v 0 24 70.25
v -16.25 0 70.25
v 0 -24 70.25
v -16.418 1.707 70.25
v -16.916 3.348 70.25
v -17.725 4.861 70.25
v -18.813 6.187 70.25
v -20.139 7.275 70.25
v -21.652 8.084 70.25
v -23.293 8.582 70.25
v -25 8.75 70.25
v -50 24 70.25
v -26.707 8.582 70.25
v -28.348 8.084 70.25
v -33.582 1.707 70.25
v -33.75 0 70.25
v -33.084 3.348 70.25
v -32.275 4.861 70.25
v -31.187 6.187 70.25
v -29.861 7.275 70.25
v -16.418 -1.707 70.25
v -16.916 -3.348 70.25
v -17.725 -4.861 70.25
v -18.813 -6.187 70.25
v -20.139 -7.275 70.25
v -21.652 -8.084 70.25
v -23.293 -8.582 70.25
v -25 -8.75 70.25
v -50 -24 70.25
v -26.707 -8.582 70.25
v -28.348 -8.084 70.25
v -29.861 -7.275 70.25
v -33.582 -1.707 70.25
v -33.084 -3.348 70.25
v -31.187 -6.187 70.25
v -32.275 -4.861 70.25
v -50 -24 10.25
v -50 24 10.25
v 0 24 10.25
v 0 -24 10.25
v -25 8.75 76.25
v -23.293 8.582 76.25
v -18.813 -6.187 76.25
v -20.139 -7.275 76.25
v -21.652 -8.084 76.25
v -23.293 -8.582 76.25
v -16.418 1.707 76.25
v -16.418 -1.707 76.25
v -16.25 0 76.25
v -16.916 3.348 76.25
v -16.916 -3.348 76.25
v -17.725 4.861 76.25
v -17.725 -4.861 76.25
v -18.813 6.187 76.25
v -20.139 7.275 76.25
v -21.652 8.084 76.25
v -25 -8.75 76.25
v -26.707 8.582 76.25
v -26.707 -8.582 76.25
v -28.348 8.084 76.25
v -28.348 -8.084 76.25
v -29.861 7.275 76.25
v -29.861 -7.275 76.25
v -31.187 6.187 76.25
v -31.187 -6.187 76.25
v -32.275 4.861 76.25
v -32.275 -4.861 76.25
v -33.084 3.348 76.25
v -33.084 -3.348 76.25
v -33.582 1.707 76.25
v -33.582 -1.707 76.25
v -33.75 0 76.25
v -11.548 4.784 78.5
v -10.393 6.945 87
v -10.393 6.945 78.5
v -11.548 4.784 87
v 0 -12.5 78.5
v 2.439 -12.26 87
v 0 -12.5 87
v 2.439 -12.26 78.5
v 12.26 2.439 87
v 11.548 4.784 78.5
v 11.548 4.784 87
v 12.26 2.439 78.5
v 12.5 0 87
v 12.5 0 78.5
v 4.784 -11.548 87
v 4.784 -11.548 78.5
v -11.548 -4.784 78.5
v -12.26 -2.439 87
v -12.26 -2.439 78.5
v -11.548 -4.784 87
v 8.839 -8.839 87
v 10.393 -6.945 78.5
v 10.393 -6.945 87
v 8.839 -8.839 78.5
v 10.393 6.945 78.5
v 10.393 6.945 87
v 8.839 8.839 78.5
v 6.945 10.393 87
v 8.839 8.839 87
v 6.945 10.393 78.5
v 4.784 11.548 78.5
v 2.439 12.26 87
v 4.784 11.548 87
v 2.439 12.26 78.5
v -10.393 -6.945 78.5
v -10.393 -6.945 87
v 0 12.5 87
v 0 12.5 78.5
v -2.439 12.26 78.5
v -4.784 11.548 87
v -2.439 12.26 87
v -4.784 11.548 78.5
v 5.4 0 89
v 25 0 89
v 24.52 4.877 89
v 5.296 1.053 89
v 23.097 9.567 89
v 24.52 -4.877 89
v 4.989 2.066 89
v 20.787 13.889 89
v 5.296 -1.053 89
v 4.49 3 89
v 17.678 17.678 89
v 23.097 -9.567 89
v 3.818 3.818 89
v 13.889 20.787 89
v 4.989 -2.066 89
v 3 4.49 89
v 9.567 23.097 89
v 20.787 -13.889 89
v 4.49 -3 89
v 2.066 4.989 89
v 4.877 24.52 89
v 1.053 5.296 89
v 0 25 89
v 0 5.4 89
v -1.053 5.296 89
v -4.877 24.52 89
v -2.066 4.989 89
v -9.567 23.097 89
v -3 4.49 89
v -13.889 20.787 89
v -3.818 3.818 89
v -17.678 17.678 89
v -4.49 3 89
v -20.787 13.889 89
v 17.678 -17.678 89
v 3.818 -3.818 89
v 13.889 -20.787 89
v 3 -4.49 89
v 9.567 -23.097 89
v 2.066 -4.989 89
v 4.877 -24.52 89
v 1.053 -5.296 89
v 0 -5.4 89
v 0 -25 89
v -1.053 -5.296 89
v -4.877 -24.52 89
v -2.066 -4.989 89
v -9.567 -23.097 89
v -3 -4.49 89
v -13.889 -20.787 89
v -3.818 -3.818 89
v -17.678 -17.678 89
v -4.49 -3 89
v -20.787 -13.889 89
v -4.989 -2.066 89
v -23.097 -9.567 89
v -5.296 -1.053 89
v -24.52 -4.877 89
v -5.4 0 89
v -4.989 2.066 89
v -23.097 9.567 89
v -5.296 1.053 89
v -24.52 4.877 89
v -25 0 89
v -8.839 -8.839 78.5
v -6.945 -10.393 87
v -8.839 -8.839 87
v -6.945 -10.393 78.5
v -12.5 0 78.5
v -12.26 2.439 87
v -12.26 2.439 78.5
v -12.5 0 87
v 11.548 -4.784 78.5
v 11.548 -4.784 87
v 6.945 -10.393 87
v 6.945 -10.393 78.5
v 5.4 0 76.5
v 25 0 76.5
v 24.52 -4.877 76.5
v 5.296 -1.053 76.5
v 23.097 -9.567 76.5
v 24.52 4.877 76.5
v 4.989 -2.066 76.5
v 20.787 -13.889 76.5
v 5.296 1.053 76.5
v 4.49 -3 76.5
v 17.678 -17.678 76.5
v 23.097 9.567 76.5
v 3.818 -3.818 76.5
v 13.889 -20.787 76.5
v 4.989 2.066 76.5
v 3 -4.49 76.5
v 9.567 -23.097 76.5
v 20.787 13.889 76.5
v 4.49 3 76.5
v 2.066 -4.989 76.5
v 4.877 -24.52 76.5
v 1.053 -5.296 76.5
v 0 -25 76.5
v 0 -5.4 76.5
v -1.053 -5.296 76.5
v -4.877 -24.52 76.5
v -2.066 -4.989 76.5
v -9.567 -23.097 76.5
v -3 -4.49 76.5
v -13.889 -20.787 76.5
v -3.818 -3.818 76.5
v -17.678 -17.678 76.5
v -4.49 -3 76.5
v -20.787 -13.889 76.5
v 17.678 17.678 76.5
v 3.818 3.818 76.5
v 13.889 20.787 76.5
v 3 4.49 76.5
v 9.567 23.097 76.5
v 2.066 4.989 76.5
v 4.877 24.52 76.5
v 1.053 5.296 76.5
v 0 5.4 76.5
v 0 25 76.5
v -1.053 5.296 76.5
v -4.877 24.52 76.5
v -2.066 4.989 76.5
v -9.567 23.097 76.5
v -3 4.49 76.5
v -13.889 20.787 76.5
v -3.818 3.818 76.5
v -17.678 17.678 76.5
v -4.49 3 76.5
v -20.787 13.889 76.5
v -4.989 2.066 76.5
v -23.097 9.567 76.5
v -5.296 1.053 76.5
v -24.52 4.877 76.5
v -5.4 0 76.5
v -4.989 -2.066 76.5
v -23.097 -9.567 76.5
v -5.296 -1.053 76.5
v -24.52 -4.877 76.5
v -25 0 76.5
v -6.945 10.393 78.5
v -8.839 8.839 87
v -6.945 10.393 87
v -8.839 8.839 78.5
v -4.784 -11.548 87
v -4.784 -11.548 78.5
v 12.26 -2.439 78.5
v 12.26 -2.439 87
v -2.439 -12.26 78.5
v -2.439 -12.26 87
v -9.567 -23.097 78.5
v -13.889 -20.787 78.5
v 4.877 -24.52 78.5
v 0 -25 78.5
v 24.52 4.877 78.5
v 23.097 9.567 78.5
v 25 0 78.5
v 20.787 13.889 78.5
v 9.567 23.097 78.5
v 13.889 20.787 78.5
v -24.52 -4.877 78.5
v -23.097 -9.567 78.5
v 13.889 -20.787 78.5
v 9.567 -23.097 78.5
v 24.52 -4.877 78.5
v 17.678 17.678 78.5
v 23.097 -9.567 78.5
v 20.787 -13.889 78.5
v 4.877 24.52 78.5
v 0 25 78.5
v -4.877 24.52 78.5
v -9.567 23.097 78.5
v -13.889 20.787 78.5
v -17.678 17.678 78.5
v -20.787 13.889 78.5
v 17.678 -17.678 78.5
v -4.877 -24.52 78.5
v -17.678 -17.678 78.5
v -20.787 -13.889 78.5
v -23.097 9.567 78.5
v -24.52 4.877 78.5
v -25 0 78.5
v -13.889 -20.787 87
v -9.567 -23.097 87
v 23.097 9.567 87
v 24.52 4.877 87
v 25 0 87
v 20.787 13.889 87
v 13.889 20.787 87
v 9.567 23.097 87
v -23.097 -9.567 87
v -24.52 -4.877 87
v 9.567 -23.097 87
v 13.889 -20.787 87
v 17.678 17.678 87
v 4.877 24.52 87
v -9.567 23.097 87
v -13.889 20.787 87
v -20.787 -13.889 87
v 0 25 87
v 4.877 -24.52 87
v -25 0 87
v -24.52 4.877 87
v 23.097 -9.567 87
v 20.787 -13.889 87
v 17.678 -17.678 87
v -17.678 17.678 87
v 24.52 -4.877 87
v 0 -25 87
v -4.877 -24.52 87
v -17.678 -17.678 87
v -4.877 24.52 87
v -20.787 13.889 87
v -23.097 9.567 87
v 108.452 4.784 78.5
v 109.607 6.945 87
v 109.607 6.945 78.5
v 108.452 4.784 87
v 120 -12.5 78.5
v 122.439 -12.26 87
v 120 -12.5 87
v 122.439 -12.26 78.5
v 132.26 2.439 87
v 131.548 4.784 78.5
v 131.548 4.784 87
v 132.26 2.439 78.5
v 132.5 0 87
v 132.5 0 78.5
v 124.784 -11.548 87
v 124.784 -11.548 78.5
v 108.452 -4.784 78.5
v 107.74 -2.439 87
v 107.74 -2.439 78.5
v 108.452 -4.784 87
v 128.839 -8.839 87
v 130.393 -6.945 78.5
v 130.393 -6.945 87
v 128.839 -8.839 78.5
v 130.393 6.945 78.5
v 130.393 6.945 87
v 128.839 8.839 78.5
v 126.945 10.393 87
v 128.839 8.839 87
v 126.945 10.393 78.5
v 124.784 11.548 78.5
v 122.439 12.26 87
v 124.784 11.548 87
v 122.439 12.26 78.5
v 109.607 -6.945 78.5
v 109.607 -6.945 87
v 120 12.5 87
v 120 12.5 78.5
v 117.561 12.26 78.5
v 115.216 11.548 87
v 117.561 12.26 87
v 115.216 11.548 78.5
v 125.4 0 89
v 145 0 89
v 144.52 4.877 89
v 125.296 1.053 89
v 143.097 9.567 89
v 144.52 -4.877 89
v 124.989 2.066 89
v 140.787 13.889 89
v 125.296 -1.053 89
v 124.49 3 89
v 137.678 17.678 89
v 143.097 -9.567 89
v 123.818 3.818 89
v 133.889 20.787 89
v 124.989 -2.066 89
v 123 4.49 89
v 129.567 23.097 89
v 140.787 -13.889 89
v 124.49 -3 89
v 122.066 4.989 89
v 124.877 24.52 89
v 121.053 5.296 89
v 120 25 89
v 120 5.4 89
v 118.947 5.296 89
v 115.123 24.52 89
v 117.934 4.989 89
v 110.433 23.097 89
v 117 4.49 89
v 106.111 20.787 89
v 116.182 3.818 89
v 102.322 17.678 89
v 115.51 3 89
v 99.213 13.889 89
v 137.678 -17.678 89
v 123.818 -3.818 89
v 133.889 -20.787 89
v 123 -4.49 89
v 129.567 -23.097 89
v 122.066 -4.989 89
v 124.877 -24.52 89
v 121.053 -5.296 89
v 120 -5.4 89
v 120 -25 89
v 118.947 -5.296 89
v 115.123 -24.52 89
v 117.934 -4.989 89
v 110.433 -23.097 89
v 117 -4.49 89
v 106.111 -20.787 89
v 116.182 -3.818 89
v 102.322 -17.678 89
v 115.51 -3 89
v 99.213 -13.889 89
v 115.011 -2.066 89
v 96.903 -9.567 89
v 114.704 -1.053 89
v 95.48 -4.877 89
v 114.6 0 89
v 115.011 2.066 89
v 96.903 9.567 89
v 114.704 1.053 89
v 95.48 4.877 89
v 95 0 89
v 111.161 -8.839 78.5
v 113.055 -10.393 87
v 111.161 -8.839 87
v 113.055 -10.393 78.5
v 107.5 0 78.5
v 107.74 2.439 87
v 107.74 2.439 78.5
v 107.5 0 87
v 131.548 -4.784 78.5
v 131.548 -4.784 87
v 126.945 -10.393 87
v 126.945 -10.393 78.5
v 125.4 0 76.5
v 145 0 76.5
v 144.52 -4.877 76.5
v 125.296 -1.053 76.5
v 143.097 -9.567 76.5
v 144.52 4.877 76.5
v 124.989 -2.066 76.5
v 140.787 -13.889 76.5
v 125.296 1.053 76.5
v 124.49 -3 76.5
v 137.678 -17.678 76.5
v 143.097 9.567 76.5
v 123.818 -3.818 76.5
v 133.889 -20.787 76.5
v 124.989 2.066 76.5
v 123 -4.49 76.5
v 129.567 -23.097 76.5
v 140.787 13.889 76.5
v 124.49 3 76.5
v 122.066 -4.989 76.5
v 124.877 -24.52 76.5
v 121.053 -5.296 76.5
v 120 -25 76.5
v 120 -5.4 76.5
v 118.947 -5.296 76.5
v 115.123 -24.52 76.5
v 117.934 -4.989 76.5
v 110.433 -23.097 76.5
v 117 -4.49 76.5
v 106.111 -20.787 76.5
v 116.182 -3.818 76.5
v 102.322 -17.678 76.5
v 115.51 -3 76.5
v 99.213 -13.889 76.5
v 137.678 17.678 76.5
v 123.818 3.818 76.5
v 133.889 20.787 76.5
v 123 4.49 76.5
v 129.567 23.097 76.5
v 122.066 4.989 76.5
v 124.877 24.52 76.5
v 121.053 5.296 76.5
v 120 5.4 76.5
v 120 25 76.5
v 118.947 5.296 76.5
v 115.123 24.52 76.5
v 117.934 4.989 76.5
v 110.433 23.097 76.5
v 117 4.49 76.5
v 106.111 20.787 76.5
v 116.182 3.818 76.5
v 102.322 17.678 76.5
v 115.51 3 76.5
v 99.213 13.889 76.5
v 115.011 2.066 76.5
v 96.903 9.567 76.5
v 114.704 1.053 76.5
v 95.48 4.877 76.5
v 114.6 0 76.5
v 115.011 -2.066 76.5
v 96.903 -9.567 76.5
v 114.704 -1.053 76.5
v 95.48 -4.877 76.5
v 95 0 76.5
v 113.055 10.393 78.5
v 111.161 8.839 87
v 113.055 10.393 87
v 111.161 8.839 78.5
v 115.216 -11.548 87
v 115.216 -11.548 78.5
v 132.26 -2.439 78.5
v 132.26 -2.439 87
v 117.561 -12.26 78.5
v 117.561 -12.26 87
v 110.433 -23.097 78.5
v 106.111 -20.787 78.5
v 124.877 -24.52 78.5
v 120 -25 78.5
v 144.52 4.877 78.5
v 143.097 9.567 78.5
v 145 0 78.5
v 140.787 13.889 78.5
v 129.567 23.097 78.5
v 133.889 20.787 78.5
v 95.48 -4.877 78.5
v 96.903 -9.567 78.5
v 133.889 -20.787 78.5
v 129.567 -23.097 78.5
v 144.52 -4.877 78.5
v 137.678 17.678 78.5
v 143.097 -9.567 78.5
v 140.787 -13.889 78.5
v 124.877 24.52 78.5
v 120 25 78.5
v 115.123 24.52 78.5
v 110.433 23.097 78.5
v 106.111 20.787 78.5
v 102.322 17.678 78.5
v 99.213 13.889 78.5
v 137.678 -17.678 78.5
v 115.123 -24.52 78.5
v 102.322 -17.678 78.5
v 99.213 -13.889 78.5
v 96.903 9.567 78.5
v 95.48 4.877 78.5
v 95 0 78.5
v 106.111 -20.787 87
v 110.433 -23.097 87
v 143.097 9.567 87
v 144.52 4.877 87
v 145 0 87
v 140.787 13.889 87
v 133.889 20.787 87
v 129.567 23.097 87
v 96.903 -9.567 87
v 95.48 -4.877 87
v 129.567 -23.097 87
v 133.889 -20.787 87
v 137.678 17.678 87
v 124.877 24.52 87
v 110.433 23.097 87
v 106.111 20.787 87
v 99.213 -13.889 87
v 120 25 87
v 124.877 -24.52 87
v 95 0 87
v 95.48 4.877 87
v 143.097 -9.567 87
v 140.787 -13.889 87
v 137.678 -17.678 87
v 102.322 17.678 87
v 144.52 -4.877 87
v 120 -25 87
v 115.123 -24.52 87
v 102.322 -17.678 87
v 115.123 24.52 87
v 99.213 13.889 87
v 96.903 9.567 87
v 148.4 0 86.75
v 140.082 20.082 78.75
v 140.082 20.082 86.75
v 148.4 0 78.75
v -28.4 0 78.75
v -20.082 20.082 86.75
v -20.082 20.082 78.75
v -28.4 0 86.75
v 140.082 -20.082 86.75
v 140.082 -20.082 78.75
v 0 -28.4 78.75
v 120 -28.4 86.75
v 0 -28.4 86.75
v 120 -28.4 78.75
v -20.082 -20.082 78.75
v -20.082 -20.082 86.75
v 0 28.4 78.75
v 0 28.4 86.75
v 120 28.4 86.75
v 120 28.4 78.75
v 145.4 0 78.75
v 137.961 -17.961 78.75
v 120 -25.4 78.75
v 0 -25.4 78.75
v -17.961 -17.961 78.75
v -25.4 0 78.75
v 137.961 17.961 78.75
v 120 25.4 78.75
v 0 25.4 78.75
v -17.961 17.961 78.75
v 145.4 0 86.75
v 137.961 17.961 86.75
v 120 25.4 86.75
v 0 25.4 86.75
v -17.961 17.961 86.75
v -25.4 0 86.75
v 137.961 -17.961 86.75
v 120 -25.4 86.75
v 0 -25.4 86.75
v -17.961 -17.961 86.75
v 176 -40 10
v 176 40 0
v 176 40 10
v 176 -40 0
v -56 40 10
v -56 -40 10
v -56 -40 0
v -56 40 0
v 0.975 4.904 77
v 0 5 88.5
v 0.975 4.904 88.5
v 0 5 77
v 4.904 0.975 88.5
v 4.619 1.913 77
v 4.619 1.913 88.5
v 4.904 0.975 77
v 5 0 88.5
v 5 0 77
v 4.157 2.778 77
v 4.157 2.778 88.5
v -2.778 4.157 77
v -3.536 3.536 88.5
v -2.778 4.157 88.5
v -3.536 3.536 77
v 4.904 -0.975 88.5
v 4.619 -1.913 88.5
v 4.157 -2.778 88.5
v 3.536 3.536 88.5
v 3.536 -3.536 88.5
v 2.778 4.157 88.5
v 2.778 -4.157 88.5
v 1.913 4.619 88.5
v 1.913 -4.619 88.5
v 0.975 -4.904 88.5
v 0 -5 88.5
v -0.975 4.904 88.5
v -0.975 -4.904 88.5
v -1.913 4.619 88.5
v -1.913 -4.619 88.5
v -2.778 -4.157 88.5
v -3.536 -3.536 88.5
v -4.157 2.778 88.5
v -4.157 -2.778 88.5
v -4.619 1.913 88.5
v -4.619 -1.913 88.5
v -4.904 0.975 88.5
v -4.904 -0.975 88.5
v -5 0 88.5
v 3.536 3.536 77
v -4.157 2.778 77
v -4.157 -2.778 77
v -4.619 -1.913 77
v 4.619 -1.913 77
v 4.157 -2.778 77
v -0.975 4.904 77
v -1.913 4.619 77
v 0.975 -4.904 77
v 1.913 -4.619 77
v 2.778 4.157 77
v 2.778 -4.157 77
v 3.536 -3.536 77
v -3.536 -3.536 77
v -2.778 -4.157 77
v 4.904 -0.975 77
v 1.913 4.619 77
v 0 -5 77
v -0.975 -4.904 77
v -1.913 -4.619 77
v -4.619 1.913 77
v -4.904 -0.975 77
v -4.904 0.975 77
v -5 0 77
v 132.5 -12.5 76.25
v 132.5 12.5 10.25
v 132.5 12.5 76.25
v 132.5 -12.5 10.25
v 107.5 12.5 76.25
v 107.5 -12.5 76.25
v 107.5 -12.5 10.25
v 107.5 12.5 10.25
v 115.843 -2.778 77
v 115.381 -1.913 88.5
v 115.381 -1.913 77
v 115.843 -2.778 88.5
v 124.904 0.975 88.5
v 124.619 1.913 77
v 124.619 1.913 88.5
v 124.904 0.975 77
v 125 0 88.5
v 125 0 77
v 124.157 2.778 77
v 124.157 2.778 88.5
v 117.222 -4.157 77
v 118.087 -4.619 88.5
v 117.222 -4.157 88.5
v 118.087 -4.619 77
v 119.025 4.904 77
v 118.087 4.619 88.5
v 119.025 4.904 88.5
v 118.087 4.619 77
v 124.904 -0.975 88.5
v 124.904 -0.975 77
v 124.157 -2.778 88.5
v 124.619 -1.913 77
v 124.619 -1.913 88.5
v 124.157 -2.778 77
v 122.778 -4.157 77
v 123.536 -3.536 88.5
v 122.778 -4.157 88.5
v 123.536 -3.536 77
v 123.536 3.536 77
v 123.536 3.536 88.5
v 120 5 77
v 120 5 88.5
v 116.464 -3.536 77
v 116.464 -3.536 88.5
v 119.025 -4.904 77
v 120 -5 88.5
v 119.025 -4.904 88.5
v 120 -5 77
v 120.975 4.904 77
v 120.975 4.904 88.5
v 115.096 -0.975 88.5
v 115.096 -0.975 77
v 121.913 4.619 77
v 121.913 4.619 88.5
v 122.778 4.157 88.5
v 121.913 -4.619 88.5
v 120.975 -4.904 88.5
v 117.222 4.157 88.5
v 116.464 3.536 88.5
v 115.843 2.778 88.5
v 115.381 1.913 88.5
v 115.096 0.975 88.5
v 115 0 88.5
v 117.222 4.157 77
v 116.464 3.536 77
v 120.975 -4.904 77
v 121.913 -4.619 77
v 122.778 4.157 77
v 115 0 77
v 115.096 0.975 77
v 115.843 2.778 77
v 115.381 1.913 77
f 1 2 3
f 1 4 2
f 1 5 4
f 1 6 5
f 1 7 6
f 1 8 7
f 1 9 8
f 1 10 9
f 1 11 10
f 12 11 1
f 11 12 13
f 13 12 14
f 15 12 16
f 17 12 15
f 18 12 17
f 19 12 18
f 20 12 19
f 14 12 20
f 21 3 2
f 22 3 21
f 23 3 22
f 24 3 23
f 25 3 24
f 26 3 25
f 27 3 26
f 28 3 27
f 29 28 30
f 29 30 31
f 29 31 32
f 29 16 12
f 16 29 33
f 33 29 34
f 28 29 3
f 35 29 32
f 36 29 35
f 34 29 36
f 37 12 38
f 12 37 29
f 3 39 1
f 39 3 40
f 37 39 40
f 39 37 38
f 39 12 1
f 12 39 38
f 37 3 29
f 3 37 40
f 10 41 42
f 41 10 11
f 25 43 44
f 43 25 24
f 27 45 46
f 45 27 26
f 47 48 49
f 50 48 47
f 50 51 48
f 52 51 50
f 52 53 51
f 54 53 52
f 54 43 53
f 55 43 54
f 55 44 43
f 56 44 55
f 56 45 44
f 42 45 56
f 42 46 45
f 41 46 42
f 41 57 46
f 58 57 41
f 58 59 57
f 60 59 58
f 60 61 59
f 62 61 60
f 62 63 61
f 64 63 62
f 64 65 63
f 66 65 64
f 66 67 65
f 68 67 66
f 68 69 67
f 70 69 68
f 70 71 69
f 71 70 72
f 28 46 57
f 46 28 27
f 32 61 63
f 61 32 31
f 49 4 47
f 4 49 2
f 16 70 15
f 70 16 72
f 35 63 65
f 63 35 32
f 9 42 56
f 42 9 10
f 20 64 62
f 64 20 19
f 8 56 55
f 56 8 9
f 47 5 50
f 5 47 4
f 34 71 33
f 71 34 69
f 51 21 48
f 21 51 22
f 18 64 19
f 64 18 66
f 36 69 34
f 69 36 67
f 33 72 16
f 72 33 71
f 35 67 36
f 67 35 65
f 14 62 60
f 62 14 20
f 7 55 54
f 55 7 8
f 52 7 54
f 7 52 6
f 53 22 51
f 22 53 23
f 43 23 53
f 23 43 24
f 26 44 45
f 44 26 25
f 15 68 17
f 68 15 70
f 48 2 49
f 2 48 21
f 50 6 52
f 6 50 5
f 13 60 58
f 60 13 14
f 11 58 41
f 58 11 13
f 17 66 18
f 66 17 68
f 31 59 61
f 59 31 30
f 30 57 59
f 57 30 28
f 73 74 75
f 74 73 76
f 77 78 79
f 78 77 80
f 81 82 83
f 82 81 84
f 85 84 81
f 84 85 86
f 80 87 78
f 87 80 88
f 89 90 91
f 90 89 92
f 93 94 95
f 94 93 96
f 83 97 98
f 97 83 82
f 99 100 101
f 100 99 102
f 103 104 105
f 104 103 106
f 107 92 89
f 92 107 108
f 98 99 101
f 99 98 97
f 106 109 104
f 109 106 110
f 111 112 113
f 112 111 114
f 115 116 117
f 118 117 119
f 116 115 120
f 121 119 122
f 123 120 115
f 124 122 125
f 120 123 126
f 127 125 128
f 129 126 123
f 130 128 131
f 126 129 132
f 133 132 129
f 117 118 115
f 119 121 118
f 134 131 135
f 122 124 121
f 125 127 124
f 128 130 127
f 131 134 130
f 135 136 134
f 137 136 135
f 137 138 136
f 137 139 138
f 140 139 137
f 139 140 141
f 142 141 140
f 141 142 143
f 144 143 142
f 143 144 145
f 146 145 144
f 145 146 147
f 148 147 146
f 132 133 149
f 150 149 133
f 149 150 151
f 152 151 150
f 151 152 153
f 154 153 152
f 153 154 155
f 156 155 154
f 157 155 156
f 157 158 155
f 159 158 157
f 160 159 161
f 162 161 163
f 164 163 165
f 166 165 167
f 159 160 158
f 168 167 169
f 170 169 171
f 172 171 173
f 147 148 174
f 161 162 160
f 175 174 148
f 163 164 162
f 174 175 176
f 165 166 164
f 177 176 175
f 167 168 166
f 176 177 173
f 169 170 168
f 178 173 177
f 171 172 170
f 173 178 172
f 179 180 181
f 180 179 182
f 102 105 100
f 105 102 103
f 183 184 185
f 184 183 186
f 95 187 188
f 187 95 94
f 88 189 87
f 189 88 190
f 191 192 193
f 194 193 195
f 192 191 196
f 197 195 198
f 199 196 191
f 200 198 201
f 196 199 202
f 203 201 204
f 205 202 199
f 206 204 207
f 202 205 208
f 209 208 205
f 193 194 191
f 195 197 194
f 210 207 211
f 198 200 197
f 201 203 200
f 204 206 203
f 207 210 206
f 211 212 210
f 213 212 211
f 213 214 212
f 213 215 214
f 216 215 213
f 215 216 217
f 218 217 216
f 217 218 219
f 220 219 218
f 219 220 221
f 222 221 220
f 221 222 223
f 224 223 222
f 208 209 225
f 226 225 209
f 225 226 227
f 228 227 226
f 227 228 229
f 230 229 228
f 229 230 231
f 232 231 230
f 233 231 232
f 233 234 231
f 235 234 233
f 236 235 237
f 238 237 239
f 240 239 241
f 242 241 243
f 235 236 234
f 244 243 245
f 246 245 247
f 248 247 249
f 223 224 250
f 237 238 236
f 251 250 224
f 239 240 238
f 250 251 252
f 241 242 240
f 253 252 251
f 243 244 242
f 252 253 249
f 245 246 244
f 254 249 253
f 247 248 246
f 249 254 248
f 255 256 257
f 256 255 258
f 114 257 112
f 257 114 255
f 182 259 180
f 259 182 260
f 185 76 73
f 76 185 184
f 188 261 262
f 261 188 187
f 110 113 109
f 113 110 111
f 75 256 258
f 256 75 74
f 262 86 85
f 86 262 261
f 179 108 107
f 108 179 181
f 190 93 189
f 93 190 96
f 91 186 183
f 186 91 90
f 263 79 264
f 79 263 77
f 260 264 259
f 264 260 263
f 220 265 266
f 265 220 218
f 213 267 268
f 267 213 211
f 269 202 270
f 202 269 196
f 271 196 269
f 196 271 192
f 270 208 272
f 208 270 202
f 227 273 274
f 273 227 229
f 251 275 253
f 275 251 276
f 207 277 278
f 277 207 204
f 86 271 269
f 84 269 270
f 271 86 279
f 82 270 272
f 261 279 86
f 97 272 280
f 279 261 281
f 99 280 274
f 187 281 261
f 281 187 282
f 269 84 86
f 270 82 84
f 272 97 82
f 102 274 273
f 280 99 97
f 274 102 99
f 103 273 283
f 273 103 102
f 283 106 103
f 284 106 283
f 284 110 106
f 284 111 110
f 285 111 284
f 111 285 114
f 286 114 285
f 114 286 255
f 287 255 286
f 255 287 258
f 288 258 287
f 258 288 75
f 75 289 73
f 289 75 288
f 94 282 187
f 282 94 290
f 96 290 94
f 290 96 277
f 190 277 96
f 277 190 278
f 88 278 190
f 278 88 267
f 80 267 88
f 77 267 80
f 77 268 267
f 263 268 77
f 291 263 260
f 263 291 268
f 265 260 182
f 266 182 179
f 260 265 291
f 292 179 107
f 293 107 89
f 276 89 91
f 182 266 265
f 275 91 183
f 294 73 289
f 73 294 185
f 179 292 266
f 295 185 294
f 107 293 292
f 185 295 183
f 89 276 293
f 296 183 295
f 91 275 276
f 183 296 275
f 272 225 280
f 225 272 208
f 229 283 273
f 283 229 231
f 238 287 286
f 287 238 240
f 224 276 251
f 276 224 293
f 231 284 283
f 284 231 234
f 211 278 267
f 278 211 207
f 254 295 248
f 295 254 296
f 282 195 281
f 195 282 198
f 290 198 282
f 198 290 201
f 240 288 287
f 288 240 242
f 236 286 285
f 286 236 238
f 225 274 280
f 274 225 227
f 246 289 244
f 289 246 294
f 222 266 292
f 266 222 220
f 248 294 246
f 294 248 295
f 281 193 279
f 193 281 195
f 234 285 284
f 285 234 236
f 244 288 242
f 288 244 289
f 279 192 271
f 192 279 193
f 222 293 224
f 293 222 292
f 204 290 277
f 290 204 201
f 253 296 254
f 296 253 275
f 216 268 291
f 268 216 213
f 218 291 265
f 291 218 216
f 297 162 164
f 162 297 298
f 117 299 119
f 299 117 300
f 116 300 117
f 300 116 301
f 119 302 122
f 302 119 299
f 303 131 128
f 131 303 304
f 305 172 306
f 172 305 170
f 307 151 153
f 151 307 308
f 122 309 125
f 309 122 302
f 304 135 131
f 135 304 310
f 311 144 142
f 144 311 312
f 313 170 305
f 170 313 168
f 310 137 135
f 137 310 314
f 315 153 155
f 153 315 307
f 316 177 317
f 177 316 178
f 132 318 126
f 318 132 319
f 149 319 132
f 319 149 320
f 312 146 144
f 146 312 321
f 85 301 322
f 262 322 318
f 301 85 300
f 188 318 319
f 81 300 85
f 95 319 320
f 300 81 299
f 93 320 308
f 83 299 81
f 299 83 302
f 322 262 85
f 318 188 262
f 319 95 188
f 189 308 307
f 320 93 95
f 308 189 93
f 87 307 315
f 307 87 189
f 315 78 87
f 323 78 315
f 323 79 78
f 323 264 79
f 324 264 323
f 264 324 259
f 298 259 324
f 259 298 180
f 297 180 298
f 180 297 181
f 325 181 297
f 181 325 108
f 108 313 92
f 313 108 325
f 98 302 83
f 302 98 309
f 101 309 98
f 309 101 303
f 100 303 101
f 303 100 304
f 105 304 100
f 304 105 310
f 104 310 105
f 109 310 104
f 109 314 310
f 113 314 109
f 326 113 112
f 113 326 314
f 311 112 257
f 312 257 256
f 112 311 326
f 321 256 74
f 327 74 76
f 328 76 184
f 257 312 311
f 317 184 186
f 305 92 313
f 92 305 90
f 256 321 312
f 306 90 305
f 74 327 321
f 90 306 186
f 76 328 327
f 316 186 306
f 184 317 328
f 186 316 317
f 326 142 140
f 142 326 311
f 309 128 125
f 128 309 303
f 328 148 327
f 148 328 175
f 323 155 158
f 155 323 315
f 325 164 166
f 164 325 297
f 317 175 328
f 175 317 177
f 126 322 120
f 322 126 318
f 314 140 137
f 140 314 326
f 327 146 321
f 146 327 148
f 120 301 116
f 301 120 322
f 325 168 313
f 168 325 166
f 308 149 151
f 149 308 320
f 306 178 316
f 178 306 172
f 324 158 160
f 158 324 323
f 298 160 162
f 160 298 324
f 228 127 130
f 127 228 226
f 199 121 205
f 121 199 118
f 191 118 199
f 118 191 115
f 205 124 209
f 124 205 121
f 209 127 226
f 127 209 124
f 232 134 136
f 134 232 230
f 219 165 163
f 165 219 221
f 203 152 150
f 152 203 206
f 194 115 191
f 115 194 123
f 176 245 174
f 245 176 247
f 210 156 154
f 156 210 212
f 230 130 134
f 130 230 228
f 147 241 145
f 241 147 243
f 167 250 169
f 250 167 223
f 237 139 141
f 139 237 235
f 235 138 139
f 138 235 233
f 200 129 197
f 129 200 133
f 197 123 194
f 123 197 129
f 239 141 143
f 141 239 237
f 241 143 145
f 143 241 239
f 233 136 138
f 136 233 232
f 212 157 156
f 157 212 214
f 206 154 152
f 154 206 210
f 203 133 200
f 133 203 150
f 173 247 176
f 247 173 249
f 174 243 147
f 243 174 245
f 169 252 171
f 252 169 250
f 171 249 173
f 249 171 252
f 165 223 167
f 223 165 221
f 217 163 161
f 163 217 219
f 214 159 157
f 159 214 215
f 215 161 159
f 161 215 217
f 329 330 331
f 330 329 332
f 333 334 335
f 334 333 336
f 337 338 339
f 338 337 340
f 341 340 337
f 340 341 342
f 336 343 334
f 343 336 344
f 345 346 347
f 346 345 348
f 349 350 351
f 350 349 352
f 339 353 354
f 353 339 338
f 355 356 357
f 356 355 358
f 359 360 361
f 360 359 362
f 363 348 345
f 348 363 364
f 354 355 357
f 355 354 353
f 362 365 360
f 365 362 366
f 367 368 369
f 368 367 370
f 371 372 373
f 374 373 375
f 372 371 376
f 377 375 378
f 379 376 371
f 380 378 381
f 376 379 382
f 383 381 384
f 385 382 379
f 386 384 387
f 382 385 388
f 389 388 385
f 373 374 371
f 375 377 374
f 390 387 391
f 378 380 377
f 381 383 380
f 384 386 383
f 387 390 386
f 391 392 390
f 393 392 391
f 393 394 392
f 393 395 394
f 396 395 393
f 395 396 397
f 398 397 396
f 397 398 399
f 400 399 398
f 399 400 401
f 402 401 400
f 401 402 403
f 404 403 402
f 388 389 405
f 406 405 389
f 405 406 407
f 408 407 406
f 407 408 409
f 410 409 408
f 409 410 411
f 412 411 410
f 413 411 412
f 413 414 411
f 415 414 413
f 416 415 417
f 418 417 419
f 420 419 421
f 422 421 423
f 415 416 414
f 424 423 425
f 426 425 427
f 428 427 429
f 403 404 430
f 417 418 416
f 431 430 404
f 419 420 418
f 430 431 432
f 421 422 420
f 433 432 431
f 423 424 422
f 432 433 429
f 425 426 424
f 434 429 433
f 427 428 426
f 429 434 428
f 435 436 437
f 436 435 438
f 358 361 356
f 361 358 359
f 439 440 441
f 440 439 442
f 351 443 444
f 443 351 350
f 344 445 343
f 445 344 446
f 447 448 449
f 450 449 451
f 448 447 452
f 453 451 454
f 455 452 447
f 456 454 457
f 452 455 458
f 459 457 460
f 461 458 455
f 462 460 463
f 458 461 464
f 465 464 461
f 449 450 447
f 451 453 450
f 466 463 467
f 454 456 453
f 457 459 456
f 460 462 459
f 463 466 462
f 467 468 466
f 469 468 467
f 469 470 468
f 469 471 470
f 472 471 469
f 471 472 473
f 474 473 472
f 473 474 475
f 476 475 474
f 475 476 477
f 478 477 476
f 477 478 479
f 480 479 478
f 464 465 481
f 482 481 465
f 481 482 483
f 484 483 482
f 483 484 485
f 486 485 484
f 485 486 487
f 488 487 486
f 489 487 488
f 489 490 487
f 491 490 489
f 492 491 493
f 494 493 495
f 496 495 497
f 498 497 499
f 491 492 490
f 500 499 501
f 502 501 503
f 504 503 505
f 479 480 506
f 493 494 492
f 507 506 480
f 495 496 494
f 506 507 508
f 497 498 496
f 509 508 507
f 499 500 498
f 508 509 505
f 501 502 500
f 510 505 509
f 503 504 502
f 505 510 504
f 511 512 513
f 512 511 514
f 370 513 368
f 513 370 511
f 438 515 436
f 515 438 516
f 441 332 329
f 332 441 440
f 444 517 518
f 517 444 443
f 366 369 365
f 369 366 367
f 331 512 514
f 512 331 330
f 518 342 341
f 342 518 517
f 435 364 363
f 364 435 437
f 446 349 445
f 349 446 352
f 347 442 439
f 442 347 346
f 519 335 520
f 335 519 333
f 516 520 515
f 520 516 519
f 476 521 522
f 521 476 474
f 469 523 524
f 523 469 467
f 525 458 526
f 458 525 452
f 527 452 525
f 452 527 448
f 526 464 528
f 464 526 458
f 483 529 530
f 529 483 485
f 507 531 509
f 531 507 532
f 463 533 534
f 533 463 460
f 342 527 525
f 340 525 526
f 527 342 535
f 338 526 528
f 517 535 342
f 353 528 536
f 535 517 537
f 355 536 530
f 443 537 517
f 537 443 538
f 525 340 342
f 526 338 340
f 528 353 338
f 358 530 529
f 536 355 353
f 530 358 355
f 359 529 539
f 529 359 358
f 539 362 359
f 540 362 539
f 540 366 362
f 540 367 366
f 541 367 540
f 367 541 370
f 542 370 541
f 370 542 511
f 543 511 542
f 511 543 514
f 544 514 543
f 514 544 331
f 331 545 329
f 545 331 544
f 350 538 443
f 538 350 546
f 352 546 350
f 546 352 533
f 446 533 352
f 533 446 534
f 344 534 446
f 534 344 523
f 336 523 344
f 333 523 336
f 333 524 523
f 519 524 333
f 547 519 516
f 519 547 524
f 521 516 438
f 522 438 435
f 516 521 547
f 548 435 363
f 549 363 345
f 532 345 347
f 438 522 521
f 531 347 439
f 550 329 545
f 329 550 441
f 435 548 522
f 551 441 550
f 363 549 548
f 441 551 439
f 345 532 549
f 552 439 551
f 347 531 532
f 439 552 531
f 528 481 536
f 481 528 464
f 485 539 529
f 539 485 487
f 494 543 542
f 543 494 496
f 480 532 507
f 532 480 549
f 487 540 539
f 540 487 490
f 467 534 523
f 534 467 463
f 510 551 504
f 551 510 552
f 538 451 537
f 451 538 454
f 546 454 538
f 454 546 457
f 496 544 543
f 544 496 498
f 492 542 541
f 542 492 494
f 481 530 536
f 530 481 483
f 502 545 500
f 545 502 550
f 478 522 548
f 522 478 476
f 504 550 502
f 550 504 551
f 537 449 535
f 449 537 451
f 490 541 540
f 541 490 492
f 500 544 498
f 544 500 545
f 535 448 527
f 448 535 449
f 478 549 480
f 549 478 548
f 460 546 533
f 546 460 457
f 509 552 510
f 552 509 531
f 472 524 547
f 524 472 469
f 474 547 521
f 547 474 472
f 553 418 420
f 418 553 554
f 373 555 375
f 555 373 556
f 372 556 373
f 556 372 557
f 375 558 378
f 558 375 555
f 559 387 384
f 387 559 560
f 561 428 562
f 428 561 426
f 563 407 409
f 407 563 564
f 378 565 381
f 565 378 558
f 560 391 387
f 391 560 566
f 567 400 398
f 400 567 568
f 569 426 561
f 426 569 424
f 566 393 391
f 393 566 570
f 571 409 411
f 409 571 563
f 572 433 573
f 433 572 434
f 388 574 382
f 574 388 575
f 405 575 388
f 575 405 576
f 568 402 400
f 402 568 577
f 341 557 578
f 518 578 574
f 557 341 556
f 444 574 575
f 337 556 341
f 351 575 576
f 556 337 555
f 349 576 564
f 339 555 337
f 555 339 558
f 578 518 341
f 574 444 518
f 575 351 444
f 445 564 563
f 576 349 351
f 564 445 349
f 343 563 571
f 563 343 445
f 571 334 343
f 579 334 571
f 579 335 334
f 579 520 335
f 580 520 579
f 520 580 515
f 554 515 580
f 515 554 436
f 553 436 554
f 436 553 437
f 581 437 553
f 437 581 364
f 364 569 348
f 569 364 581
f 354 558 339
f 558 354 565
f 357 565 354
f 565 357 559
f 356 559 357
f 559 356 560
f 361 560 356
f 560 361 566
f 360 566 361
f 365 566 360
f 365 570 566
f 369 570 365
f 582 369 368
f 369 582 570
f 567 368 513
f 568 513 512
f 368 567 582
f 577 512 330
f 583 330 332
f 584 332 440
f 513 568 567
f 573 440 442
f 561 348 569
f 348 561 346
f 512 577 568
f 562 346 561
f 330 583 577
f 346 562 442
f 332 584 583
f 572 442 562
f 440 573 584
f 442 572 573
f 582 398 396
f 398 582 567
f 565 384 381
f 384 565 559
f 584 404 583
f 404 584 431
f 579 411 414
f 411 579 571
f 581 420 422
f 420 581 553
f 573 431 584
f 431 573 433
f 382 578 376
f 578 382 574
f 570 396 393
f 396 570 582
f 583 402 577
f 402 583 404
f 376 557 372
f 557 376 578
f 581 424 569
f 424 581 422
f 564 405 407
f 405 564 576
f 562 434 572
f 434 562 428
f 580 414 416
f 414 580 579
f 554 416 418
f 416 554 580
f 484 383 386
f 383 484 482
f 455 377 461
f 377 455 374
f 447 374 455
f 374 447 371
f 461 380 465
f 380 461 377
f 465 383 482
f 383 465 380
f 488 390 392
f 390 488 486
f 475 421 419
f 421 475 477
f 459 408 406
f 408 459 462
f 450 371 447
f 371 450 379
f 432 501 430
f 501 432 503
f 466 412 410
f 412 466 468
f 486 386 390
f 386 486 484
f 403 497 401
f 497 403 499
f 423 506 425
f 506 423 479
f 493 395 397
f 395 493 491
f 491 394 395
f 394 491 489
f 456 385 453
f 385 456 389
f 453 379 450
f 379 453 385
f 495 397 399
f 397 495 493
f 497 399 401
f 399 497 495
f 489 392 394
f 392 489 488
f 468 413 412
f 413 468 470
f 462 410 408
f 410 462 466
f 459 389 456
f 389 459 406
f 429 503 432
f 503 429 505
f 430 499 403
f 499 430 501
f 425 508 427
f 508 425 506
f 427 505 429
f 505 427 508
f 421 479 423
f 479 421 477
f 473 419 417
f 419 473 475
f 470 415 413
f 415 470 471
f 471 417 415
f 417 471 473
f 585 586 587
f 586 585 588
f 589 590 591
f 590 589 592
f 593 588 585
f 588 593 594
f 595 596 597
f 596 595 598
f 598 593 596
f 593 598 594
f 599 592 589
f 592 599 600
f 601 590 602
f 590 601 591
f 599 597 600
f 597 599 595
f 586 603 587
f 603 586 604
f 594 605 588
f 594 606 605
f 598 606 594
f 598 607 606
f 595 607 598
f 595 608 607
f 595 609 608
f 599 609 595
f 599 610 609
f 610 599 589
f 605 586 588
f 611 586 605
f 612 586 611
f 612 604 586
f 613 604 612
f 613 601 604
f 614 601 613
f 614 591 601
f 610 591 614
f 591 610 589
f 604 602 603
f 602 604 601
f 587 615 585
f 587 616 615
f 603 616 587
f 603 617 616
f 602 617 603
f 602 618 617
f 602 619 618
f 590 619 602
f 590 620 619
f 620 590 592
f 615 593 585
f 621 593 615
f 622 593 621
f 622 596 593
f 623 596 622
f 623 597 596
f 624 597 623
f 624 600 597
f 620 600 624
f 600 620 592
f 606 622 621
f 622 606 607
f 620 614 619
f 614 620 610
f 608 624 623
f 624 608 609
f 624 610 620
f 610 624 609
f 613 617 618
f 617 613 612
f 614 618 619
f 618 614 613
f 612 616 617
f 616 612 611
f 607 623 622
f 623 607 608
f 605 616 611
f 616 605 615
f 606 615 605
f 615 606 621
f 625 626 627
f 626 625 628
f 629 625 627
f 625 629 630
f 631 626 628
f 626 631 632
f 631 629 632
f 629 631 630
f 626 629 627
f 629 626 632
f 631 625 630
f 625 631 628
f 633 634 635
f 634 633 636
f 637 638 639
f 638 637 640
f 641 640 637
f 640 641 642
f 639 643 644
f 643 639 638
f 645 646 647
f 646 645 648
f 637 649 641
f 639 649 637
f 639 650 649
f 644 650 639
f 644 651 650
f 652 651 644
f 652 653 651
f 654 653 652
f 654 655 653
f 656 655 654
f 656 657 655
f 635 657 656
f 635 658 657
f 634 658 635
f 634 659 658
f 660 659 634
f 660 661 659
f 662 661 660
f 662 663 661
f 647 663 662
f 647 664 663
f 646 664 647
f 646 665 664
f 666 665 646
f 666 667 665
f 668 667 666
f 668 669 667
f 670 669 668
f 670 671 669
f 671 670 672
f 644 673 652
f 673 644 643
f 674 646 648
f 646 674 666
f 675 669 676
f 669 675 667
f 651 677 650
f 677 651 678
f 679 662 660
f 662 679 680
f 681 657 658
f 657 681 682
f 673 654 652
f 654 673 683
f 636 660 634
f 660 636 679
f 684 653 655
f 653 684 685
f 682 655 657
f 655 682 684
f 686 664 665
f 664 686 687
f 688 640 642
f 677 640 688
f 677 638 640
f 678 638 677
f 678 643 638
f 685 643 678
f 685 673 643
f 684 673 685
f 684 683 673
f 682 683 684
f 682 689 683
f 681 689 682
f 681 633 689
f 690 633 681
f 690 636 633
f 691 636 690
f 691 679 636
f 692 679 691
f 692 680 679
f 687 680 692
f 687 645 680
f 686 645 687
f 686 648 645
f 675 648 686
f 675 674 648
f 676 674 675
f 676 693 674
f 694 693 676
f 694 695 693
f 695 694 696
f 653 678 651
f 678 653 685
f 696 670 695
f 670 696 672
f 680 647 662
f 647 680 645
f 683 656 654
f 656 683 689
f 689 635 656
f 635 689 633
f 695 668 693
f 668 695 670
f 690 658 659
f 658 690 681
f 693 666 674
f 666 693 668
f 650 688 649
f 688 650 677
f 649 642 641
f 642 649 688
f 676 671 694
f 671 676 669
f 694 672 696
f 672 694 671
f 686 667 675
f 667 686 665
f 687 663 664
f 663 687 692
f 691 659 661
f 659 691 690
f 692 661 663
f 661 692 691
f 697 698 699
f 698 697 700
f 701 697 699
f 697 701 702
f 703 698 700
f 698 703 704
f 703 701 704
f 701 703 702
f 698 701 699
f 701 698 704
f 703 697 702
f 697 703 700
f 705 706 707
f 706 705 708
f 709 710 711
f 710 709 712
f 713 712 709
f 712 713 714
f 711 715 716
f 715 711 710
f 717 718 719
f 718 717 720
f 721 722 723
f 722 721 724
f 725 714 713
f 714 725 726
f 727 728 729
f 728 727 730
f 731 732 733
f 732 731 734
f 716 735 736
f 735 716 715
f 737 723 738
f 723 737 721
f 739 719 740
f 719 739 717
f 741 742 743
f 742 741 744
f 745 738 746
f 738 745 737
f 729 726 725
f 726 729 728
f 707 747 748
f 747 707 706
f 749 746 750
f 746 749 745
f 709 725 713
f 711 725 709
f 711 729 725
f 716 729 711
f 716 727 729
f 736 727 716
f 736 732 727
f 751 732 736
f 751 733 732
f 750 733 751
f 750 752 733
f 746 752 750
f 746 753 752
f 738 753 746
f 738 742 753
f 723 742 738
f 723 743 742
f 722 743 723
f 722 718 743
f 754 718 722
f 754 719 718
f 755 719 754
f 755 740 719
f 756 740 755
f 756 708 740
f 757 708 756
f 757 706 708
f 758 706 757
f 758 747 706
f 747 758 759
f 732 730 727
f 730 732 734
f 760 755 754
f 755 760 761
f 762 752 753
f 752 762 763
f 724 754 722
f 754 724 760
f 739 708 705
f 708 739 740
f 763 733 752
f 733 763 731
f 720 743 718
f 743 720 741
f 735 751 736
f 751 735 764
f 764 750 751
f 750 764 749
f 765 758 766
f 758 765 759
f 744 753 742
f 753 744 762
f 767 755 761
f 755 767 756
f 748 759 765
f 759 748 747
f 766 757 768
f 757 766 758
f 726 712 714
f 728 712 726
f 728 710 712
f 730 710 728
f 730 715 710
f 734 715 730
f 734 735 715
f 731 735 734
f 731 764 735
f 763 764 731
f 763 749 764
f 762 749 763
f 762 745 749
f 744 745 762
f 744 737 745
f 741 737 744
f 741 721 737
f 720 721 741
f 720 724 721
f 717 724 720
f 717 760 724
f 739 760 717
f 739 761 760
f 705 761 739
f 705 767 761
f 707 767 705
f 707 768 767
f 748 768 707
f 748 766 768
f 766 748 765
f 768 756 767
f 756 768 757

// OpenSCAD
$fn = 32;

// ------------------------------------------------------------------------
// Motor belt drive: span 120 mm, pulleys d50, belt 8 mm wide
// Every part is its own module, assembly() places every instance.
// ------------------------------------------------------------------------

// --- part 1 ---
module base_plate() {
  difference() {
    translate([-116, -40, 0]) cube([232, 80, 10]);
  }
}

// --- part 2 ---
module motor() {
  union() {
    translate([-30, -24, 0]) cube([60, 48, 50]);
    translate([33, 0, 25]) rotate([0, 90, 0]) cylinder(h = 6, d = 17.5, center = true);
  }
}

// --- part 3 ---
module drive_shaft() {
  translate([0, 0, -5.75]) cylinder(h = 11.5, d = 10);
}

// --- part 4 ---
module pulley_drive() {
  difference() {
    union() {
      cylinder(h = 12.5, d = 25);
      cylinder(h = 2, d = 50);
      translate([0, 0, 10.5]) cylinder(h = 2, d = 50);
    }
    translate([0, 0, -1]) cylinder(h = 14.5, d = 10.8);
  }
}

// --- part 5 ---
module idler_post() {
  translate([-12.5, -12.5, 0]) cube([25, 25, 66]);
}

// --- part 6 ---
module driven_shaft() {
  translate([0, 0, -5.75]) cylinder(h = 11.5, d = 10);
}

// --- part 7 ---
module pulley_driven() {
  difference() {
    union() {
      cylinder(h = 12.5, d = 25);
      cylinder(h = 2, d = 50);
      translate([0, 0, 10.5]) cylinder(h = 2, d = 50);
    }
    translate([0, 0, -1]) cylinder(h = 14.5, d = 10.8);
  }
}

// --- part 8 ---
module drive_belt() {
  difference() {
    linear_extrude(height = 8) polygon(points = concat([for (a = [90 : 45 : 270]) [28.4 * cos(a), 28.4 * sin(a)]], [for (a = [270 : 45 : 450]) [120 + 28.4 * cos(a), 28.4 * sin(a)]]));
    translate([0, 0, -1]) linear_extrude(height = 10) polygon(points = concat([for (a = [90 : 45 : 270]) [25.4 * cos(a), 25.4 * sin(a)]], [for (a = [270 : 45 : 450]) [120 + 25.4 * cos(a), 25.4 * sin(a)]]));
  }
}

// --- assembly ---
module assembly() {
  color([0.80, 0.24, 0.20]) translate([60, 0, 0]) rotate([0, 0, 0]) base_plate();
  color([0.20, 0.45, 0.75]) translate([0, 0, 40.25]) rotate([0, 270, 0]) motor();
  color([0.25, 0.62, 0.32]) translate([0, 0, 82.75]) rotate([0, 0, 0]) drive_shaft();
  color([0.92, 0.70, 0.18]) translate([0, 0, 76.5]) rotate([0, 0, 0]) pulley_drive();
  color([0.58, 0.35, 0.70]) translate([120, 0, 10.25]) rotate([0, 0, 0]) idler_post();
  color([0.16, 0.66, 0.66]) translate([120, 0, 82.75]) rotate([0, 0, 0]) driven_shaft();
  color([0.85, 0.48, 0.18]) translate([120, 0, 76.5]) rotate([0, 0, 0]) pulley_driven();
  color([0.55, 0.60, 0.65]) translate([0, 0, 78.75]) rotate([0, 0, 0]) drive_belt();
}

assembly();
